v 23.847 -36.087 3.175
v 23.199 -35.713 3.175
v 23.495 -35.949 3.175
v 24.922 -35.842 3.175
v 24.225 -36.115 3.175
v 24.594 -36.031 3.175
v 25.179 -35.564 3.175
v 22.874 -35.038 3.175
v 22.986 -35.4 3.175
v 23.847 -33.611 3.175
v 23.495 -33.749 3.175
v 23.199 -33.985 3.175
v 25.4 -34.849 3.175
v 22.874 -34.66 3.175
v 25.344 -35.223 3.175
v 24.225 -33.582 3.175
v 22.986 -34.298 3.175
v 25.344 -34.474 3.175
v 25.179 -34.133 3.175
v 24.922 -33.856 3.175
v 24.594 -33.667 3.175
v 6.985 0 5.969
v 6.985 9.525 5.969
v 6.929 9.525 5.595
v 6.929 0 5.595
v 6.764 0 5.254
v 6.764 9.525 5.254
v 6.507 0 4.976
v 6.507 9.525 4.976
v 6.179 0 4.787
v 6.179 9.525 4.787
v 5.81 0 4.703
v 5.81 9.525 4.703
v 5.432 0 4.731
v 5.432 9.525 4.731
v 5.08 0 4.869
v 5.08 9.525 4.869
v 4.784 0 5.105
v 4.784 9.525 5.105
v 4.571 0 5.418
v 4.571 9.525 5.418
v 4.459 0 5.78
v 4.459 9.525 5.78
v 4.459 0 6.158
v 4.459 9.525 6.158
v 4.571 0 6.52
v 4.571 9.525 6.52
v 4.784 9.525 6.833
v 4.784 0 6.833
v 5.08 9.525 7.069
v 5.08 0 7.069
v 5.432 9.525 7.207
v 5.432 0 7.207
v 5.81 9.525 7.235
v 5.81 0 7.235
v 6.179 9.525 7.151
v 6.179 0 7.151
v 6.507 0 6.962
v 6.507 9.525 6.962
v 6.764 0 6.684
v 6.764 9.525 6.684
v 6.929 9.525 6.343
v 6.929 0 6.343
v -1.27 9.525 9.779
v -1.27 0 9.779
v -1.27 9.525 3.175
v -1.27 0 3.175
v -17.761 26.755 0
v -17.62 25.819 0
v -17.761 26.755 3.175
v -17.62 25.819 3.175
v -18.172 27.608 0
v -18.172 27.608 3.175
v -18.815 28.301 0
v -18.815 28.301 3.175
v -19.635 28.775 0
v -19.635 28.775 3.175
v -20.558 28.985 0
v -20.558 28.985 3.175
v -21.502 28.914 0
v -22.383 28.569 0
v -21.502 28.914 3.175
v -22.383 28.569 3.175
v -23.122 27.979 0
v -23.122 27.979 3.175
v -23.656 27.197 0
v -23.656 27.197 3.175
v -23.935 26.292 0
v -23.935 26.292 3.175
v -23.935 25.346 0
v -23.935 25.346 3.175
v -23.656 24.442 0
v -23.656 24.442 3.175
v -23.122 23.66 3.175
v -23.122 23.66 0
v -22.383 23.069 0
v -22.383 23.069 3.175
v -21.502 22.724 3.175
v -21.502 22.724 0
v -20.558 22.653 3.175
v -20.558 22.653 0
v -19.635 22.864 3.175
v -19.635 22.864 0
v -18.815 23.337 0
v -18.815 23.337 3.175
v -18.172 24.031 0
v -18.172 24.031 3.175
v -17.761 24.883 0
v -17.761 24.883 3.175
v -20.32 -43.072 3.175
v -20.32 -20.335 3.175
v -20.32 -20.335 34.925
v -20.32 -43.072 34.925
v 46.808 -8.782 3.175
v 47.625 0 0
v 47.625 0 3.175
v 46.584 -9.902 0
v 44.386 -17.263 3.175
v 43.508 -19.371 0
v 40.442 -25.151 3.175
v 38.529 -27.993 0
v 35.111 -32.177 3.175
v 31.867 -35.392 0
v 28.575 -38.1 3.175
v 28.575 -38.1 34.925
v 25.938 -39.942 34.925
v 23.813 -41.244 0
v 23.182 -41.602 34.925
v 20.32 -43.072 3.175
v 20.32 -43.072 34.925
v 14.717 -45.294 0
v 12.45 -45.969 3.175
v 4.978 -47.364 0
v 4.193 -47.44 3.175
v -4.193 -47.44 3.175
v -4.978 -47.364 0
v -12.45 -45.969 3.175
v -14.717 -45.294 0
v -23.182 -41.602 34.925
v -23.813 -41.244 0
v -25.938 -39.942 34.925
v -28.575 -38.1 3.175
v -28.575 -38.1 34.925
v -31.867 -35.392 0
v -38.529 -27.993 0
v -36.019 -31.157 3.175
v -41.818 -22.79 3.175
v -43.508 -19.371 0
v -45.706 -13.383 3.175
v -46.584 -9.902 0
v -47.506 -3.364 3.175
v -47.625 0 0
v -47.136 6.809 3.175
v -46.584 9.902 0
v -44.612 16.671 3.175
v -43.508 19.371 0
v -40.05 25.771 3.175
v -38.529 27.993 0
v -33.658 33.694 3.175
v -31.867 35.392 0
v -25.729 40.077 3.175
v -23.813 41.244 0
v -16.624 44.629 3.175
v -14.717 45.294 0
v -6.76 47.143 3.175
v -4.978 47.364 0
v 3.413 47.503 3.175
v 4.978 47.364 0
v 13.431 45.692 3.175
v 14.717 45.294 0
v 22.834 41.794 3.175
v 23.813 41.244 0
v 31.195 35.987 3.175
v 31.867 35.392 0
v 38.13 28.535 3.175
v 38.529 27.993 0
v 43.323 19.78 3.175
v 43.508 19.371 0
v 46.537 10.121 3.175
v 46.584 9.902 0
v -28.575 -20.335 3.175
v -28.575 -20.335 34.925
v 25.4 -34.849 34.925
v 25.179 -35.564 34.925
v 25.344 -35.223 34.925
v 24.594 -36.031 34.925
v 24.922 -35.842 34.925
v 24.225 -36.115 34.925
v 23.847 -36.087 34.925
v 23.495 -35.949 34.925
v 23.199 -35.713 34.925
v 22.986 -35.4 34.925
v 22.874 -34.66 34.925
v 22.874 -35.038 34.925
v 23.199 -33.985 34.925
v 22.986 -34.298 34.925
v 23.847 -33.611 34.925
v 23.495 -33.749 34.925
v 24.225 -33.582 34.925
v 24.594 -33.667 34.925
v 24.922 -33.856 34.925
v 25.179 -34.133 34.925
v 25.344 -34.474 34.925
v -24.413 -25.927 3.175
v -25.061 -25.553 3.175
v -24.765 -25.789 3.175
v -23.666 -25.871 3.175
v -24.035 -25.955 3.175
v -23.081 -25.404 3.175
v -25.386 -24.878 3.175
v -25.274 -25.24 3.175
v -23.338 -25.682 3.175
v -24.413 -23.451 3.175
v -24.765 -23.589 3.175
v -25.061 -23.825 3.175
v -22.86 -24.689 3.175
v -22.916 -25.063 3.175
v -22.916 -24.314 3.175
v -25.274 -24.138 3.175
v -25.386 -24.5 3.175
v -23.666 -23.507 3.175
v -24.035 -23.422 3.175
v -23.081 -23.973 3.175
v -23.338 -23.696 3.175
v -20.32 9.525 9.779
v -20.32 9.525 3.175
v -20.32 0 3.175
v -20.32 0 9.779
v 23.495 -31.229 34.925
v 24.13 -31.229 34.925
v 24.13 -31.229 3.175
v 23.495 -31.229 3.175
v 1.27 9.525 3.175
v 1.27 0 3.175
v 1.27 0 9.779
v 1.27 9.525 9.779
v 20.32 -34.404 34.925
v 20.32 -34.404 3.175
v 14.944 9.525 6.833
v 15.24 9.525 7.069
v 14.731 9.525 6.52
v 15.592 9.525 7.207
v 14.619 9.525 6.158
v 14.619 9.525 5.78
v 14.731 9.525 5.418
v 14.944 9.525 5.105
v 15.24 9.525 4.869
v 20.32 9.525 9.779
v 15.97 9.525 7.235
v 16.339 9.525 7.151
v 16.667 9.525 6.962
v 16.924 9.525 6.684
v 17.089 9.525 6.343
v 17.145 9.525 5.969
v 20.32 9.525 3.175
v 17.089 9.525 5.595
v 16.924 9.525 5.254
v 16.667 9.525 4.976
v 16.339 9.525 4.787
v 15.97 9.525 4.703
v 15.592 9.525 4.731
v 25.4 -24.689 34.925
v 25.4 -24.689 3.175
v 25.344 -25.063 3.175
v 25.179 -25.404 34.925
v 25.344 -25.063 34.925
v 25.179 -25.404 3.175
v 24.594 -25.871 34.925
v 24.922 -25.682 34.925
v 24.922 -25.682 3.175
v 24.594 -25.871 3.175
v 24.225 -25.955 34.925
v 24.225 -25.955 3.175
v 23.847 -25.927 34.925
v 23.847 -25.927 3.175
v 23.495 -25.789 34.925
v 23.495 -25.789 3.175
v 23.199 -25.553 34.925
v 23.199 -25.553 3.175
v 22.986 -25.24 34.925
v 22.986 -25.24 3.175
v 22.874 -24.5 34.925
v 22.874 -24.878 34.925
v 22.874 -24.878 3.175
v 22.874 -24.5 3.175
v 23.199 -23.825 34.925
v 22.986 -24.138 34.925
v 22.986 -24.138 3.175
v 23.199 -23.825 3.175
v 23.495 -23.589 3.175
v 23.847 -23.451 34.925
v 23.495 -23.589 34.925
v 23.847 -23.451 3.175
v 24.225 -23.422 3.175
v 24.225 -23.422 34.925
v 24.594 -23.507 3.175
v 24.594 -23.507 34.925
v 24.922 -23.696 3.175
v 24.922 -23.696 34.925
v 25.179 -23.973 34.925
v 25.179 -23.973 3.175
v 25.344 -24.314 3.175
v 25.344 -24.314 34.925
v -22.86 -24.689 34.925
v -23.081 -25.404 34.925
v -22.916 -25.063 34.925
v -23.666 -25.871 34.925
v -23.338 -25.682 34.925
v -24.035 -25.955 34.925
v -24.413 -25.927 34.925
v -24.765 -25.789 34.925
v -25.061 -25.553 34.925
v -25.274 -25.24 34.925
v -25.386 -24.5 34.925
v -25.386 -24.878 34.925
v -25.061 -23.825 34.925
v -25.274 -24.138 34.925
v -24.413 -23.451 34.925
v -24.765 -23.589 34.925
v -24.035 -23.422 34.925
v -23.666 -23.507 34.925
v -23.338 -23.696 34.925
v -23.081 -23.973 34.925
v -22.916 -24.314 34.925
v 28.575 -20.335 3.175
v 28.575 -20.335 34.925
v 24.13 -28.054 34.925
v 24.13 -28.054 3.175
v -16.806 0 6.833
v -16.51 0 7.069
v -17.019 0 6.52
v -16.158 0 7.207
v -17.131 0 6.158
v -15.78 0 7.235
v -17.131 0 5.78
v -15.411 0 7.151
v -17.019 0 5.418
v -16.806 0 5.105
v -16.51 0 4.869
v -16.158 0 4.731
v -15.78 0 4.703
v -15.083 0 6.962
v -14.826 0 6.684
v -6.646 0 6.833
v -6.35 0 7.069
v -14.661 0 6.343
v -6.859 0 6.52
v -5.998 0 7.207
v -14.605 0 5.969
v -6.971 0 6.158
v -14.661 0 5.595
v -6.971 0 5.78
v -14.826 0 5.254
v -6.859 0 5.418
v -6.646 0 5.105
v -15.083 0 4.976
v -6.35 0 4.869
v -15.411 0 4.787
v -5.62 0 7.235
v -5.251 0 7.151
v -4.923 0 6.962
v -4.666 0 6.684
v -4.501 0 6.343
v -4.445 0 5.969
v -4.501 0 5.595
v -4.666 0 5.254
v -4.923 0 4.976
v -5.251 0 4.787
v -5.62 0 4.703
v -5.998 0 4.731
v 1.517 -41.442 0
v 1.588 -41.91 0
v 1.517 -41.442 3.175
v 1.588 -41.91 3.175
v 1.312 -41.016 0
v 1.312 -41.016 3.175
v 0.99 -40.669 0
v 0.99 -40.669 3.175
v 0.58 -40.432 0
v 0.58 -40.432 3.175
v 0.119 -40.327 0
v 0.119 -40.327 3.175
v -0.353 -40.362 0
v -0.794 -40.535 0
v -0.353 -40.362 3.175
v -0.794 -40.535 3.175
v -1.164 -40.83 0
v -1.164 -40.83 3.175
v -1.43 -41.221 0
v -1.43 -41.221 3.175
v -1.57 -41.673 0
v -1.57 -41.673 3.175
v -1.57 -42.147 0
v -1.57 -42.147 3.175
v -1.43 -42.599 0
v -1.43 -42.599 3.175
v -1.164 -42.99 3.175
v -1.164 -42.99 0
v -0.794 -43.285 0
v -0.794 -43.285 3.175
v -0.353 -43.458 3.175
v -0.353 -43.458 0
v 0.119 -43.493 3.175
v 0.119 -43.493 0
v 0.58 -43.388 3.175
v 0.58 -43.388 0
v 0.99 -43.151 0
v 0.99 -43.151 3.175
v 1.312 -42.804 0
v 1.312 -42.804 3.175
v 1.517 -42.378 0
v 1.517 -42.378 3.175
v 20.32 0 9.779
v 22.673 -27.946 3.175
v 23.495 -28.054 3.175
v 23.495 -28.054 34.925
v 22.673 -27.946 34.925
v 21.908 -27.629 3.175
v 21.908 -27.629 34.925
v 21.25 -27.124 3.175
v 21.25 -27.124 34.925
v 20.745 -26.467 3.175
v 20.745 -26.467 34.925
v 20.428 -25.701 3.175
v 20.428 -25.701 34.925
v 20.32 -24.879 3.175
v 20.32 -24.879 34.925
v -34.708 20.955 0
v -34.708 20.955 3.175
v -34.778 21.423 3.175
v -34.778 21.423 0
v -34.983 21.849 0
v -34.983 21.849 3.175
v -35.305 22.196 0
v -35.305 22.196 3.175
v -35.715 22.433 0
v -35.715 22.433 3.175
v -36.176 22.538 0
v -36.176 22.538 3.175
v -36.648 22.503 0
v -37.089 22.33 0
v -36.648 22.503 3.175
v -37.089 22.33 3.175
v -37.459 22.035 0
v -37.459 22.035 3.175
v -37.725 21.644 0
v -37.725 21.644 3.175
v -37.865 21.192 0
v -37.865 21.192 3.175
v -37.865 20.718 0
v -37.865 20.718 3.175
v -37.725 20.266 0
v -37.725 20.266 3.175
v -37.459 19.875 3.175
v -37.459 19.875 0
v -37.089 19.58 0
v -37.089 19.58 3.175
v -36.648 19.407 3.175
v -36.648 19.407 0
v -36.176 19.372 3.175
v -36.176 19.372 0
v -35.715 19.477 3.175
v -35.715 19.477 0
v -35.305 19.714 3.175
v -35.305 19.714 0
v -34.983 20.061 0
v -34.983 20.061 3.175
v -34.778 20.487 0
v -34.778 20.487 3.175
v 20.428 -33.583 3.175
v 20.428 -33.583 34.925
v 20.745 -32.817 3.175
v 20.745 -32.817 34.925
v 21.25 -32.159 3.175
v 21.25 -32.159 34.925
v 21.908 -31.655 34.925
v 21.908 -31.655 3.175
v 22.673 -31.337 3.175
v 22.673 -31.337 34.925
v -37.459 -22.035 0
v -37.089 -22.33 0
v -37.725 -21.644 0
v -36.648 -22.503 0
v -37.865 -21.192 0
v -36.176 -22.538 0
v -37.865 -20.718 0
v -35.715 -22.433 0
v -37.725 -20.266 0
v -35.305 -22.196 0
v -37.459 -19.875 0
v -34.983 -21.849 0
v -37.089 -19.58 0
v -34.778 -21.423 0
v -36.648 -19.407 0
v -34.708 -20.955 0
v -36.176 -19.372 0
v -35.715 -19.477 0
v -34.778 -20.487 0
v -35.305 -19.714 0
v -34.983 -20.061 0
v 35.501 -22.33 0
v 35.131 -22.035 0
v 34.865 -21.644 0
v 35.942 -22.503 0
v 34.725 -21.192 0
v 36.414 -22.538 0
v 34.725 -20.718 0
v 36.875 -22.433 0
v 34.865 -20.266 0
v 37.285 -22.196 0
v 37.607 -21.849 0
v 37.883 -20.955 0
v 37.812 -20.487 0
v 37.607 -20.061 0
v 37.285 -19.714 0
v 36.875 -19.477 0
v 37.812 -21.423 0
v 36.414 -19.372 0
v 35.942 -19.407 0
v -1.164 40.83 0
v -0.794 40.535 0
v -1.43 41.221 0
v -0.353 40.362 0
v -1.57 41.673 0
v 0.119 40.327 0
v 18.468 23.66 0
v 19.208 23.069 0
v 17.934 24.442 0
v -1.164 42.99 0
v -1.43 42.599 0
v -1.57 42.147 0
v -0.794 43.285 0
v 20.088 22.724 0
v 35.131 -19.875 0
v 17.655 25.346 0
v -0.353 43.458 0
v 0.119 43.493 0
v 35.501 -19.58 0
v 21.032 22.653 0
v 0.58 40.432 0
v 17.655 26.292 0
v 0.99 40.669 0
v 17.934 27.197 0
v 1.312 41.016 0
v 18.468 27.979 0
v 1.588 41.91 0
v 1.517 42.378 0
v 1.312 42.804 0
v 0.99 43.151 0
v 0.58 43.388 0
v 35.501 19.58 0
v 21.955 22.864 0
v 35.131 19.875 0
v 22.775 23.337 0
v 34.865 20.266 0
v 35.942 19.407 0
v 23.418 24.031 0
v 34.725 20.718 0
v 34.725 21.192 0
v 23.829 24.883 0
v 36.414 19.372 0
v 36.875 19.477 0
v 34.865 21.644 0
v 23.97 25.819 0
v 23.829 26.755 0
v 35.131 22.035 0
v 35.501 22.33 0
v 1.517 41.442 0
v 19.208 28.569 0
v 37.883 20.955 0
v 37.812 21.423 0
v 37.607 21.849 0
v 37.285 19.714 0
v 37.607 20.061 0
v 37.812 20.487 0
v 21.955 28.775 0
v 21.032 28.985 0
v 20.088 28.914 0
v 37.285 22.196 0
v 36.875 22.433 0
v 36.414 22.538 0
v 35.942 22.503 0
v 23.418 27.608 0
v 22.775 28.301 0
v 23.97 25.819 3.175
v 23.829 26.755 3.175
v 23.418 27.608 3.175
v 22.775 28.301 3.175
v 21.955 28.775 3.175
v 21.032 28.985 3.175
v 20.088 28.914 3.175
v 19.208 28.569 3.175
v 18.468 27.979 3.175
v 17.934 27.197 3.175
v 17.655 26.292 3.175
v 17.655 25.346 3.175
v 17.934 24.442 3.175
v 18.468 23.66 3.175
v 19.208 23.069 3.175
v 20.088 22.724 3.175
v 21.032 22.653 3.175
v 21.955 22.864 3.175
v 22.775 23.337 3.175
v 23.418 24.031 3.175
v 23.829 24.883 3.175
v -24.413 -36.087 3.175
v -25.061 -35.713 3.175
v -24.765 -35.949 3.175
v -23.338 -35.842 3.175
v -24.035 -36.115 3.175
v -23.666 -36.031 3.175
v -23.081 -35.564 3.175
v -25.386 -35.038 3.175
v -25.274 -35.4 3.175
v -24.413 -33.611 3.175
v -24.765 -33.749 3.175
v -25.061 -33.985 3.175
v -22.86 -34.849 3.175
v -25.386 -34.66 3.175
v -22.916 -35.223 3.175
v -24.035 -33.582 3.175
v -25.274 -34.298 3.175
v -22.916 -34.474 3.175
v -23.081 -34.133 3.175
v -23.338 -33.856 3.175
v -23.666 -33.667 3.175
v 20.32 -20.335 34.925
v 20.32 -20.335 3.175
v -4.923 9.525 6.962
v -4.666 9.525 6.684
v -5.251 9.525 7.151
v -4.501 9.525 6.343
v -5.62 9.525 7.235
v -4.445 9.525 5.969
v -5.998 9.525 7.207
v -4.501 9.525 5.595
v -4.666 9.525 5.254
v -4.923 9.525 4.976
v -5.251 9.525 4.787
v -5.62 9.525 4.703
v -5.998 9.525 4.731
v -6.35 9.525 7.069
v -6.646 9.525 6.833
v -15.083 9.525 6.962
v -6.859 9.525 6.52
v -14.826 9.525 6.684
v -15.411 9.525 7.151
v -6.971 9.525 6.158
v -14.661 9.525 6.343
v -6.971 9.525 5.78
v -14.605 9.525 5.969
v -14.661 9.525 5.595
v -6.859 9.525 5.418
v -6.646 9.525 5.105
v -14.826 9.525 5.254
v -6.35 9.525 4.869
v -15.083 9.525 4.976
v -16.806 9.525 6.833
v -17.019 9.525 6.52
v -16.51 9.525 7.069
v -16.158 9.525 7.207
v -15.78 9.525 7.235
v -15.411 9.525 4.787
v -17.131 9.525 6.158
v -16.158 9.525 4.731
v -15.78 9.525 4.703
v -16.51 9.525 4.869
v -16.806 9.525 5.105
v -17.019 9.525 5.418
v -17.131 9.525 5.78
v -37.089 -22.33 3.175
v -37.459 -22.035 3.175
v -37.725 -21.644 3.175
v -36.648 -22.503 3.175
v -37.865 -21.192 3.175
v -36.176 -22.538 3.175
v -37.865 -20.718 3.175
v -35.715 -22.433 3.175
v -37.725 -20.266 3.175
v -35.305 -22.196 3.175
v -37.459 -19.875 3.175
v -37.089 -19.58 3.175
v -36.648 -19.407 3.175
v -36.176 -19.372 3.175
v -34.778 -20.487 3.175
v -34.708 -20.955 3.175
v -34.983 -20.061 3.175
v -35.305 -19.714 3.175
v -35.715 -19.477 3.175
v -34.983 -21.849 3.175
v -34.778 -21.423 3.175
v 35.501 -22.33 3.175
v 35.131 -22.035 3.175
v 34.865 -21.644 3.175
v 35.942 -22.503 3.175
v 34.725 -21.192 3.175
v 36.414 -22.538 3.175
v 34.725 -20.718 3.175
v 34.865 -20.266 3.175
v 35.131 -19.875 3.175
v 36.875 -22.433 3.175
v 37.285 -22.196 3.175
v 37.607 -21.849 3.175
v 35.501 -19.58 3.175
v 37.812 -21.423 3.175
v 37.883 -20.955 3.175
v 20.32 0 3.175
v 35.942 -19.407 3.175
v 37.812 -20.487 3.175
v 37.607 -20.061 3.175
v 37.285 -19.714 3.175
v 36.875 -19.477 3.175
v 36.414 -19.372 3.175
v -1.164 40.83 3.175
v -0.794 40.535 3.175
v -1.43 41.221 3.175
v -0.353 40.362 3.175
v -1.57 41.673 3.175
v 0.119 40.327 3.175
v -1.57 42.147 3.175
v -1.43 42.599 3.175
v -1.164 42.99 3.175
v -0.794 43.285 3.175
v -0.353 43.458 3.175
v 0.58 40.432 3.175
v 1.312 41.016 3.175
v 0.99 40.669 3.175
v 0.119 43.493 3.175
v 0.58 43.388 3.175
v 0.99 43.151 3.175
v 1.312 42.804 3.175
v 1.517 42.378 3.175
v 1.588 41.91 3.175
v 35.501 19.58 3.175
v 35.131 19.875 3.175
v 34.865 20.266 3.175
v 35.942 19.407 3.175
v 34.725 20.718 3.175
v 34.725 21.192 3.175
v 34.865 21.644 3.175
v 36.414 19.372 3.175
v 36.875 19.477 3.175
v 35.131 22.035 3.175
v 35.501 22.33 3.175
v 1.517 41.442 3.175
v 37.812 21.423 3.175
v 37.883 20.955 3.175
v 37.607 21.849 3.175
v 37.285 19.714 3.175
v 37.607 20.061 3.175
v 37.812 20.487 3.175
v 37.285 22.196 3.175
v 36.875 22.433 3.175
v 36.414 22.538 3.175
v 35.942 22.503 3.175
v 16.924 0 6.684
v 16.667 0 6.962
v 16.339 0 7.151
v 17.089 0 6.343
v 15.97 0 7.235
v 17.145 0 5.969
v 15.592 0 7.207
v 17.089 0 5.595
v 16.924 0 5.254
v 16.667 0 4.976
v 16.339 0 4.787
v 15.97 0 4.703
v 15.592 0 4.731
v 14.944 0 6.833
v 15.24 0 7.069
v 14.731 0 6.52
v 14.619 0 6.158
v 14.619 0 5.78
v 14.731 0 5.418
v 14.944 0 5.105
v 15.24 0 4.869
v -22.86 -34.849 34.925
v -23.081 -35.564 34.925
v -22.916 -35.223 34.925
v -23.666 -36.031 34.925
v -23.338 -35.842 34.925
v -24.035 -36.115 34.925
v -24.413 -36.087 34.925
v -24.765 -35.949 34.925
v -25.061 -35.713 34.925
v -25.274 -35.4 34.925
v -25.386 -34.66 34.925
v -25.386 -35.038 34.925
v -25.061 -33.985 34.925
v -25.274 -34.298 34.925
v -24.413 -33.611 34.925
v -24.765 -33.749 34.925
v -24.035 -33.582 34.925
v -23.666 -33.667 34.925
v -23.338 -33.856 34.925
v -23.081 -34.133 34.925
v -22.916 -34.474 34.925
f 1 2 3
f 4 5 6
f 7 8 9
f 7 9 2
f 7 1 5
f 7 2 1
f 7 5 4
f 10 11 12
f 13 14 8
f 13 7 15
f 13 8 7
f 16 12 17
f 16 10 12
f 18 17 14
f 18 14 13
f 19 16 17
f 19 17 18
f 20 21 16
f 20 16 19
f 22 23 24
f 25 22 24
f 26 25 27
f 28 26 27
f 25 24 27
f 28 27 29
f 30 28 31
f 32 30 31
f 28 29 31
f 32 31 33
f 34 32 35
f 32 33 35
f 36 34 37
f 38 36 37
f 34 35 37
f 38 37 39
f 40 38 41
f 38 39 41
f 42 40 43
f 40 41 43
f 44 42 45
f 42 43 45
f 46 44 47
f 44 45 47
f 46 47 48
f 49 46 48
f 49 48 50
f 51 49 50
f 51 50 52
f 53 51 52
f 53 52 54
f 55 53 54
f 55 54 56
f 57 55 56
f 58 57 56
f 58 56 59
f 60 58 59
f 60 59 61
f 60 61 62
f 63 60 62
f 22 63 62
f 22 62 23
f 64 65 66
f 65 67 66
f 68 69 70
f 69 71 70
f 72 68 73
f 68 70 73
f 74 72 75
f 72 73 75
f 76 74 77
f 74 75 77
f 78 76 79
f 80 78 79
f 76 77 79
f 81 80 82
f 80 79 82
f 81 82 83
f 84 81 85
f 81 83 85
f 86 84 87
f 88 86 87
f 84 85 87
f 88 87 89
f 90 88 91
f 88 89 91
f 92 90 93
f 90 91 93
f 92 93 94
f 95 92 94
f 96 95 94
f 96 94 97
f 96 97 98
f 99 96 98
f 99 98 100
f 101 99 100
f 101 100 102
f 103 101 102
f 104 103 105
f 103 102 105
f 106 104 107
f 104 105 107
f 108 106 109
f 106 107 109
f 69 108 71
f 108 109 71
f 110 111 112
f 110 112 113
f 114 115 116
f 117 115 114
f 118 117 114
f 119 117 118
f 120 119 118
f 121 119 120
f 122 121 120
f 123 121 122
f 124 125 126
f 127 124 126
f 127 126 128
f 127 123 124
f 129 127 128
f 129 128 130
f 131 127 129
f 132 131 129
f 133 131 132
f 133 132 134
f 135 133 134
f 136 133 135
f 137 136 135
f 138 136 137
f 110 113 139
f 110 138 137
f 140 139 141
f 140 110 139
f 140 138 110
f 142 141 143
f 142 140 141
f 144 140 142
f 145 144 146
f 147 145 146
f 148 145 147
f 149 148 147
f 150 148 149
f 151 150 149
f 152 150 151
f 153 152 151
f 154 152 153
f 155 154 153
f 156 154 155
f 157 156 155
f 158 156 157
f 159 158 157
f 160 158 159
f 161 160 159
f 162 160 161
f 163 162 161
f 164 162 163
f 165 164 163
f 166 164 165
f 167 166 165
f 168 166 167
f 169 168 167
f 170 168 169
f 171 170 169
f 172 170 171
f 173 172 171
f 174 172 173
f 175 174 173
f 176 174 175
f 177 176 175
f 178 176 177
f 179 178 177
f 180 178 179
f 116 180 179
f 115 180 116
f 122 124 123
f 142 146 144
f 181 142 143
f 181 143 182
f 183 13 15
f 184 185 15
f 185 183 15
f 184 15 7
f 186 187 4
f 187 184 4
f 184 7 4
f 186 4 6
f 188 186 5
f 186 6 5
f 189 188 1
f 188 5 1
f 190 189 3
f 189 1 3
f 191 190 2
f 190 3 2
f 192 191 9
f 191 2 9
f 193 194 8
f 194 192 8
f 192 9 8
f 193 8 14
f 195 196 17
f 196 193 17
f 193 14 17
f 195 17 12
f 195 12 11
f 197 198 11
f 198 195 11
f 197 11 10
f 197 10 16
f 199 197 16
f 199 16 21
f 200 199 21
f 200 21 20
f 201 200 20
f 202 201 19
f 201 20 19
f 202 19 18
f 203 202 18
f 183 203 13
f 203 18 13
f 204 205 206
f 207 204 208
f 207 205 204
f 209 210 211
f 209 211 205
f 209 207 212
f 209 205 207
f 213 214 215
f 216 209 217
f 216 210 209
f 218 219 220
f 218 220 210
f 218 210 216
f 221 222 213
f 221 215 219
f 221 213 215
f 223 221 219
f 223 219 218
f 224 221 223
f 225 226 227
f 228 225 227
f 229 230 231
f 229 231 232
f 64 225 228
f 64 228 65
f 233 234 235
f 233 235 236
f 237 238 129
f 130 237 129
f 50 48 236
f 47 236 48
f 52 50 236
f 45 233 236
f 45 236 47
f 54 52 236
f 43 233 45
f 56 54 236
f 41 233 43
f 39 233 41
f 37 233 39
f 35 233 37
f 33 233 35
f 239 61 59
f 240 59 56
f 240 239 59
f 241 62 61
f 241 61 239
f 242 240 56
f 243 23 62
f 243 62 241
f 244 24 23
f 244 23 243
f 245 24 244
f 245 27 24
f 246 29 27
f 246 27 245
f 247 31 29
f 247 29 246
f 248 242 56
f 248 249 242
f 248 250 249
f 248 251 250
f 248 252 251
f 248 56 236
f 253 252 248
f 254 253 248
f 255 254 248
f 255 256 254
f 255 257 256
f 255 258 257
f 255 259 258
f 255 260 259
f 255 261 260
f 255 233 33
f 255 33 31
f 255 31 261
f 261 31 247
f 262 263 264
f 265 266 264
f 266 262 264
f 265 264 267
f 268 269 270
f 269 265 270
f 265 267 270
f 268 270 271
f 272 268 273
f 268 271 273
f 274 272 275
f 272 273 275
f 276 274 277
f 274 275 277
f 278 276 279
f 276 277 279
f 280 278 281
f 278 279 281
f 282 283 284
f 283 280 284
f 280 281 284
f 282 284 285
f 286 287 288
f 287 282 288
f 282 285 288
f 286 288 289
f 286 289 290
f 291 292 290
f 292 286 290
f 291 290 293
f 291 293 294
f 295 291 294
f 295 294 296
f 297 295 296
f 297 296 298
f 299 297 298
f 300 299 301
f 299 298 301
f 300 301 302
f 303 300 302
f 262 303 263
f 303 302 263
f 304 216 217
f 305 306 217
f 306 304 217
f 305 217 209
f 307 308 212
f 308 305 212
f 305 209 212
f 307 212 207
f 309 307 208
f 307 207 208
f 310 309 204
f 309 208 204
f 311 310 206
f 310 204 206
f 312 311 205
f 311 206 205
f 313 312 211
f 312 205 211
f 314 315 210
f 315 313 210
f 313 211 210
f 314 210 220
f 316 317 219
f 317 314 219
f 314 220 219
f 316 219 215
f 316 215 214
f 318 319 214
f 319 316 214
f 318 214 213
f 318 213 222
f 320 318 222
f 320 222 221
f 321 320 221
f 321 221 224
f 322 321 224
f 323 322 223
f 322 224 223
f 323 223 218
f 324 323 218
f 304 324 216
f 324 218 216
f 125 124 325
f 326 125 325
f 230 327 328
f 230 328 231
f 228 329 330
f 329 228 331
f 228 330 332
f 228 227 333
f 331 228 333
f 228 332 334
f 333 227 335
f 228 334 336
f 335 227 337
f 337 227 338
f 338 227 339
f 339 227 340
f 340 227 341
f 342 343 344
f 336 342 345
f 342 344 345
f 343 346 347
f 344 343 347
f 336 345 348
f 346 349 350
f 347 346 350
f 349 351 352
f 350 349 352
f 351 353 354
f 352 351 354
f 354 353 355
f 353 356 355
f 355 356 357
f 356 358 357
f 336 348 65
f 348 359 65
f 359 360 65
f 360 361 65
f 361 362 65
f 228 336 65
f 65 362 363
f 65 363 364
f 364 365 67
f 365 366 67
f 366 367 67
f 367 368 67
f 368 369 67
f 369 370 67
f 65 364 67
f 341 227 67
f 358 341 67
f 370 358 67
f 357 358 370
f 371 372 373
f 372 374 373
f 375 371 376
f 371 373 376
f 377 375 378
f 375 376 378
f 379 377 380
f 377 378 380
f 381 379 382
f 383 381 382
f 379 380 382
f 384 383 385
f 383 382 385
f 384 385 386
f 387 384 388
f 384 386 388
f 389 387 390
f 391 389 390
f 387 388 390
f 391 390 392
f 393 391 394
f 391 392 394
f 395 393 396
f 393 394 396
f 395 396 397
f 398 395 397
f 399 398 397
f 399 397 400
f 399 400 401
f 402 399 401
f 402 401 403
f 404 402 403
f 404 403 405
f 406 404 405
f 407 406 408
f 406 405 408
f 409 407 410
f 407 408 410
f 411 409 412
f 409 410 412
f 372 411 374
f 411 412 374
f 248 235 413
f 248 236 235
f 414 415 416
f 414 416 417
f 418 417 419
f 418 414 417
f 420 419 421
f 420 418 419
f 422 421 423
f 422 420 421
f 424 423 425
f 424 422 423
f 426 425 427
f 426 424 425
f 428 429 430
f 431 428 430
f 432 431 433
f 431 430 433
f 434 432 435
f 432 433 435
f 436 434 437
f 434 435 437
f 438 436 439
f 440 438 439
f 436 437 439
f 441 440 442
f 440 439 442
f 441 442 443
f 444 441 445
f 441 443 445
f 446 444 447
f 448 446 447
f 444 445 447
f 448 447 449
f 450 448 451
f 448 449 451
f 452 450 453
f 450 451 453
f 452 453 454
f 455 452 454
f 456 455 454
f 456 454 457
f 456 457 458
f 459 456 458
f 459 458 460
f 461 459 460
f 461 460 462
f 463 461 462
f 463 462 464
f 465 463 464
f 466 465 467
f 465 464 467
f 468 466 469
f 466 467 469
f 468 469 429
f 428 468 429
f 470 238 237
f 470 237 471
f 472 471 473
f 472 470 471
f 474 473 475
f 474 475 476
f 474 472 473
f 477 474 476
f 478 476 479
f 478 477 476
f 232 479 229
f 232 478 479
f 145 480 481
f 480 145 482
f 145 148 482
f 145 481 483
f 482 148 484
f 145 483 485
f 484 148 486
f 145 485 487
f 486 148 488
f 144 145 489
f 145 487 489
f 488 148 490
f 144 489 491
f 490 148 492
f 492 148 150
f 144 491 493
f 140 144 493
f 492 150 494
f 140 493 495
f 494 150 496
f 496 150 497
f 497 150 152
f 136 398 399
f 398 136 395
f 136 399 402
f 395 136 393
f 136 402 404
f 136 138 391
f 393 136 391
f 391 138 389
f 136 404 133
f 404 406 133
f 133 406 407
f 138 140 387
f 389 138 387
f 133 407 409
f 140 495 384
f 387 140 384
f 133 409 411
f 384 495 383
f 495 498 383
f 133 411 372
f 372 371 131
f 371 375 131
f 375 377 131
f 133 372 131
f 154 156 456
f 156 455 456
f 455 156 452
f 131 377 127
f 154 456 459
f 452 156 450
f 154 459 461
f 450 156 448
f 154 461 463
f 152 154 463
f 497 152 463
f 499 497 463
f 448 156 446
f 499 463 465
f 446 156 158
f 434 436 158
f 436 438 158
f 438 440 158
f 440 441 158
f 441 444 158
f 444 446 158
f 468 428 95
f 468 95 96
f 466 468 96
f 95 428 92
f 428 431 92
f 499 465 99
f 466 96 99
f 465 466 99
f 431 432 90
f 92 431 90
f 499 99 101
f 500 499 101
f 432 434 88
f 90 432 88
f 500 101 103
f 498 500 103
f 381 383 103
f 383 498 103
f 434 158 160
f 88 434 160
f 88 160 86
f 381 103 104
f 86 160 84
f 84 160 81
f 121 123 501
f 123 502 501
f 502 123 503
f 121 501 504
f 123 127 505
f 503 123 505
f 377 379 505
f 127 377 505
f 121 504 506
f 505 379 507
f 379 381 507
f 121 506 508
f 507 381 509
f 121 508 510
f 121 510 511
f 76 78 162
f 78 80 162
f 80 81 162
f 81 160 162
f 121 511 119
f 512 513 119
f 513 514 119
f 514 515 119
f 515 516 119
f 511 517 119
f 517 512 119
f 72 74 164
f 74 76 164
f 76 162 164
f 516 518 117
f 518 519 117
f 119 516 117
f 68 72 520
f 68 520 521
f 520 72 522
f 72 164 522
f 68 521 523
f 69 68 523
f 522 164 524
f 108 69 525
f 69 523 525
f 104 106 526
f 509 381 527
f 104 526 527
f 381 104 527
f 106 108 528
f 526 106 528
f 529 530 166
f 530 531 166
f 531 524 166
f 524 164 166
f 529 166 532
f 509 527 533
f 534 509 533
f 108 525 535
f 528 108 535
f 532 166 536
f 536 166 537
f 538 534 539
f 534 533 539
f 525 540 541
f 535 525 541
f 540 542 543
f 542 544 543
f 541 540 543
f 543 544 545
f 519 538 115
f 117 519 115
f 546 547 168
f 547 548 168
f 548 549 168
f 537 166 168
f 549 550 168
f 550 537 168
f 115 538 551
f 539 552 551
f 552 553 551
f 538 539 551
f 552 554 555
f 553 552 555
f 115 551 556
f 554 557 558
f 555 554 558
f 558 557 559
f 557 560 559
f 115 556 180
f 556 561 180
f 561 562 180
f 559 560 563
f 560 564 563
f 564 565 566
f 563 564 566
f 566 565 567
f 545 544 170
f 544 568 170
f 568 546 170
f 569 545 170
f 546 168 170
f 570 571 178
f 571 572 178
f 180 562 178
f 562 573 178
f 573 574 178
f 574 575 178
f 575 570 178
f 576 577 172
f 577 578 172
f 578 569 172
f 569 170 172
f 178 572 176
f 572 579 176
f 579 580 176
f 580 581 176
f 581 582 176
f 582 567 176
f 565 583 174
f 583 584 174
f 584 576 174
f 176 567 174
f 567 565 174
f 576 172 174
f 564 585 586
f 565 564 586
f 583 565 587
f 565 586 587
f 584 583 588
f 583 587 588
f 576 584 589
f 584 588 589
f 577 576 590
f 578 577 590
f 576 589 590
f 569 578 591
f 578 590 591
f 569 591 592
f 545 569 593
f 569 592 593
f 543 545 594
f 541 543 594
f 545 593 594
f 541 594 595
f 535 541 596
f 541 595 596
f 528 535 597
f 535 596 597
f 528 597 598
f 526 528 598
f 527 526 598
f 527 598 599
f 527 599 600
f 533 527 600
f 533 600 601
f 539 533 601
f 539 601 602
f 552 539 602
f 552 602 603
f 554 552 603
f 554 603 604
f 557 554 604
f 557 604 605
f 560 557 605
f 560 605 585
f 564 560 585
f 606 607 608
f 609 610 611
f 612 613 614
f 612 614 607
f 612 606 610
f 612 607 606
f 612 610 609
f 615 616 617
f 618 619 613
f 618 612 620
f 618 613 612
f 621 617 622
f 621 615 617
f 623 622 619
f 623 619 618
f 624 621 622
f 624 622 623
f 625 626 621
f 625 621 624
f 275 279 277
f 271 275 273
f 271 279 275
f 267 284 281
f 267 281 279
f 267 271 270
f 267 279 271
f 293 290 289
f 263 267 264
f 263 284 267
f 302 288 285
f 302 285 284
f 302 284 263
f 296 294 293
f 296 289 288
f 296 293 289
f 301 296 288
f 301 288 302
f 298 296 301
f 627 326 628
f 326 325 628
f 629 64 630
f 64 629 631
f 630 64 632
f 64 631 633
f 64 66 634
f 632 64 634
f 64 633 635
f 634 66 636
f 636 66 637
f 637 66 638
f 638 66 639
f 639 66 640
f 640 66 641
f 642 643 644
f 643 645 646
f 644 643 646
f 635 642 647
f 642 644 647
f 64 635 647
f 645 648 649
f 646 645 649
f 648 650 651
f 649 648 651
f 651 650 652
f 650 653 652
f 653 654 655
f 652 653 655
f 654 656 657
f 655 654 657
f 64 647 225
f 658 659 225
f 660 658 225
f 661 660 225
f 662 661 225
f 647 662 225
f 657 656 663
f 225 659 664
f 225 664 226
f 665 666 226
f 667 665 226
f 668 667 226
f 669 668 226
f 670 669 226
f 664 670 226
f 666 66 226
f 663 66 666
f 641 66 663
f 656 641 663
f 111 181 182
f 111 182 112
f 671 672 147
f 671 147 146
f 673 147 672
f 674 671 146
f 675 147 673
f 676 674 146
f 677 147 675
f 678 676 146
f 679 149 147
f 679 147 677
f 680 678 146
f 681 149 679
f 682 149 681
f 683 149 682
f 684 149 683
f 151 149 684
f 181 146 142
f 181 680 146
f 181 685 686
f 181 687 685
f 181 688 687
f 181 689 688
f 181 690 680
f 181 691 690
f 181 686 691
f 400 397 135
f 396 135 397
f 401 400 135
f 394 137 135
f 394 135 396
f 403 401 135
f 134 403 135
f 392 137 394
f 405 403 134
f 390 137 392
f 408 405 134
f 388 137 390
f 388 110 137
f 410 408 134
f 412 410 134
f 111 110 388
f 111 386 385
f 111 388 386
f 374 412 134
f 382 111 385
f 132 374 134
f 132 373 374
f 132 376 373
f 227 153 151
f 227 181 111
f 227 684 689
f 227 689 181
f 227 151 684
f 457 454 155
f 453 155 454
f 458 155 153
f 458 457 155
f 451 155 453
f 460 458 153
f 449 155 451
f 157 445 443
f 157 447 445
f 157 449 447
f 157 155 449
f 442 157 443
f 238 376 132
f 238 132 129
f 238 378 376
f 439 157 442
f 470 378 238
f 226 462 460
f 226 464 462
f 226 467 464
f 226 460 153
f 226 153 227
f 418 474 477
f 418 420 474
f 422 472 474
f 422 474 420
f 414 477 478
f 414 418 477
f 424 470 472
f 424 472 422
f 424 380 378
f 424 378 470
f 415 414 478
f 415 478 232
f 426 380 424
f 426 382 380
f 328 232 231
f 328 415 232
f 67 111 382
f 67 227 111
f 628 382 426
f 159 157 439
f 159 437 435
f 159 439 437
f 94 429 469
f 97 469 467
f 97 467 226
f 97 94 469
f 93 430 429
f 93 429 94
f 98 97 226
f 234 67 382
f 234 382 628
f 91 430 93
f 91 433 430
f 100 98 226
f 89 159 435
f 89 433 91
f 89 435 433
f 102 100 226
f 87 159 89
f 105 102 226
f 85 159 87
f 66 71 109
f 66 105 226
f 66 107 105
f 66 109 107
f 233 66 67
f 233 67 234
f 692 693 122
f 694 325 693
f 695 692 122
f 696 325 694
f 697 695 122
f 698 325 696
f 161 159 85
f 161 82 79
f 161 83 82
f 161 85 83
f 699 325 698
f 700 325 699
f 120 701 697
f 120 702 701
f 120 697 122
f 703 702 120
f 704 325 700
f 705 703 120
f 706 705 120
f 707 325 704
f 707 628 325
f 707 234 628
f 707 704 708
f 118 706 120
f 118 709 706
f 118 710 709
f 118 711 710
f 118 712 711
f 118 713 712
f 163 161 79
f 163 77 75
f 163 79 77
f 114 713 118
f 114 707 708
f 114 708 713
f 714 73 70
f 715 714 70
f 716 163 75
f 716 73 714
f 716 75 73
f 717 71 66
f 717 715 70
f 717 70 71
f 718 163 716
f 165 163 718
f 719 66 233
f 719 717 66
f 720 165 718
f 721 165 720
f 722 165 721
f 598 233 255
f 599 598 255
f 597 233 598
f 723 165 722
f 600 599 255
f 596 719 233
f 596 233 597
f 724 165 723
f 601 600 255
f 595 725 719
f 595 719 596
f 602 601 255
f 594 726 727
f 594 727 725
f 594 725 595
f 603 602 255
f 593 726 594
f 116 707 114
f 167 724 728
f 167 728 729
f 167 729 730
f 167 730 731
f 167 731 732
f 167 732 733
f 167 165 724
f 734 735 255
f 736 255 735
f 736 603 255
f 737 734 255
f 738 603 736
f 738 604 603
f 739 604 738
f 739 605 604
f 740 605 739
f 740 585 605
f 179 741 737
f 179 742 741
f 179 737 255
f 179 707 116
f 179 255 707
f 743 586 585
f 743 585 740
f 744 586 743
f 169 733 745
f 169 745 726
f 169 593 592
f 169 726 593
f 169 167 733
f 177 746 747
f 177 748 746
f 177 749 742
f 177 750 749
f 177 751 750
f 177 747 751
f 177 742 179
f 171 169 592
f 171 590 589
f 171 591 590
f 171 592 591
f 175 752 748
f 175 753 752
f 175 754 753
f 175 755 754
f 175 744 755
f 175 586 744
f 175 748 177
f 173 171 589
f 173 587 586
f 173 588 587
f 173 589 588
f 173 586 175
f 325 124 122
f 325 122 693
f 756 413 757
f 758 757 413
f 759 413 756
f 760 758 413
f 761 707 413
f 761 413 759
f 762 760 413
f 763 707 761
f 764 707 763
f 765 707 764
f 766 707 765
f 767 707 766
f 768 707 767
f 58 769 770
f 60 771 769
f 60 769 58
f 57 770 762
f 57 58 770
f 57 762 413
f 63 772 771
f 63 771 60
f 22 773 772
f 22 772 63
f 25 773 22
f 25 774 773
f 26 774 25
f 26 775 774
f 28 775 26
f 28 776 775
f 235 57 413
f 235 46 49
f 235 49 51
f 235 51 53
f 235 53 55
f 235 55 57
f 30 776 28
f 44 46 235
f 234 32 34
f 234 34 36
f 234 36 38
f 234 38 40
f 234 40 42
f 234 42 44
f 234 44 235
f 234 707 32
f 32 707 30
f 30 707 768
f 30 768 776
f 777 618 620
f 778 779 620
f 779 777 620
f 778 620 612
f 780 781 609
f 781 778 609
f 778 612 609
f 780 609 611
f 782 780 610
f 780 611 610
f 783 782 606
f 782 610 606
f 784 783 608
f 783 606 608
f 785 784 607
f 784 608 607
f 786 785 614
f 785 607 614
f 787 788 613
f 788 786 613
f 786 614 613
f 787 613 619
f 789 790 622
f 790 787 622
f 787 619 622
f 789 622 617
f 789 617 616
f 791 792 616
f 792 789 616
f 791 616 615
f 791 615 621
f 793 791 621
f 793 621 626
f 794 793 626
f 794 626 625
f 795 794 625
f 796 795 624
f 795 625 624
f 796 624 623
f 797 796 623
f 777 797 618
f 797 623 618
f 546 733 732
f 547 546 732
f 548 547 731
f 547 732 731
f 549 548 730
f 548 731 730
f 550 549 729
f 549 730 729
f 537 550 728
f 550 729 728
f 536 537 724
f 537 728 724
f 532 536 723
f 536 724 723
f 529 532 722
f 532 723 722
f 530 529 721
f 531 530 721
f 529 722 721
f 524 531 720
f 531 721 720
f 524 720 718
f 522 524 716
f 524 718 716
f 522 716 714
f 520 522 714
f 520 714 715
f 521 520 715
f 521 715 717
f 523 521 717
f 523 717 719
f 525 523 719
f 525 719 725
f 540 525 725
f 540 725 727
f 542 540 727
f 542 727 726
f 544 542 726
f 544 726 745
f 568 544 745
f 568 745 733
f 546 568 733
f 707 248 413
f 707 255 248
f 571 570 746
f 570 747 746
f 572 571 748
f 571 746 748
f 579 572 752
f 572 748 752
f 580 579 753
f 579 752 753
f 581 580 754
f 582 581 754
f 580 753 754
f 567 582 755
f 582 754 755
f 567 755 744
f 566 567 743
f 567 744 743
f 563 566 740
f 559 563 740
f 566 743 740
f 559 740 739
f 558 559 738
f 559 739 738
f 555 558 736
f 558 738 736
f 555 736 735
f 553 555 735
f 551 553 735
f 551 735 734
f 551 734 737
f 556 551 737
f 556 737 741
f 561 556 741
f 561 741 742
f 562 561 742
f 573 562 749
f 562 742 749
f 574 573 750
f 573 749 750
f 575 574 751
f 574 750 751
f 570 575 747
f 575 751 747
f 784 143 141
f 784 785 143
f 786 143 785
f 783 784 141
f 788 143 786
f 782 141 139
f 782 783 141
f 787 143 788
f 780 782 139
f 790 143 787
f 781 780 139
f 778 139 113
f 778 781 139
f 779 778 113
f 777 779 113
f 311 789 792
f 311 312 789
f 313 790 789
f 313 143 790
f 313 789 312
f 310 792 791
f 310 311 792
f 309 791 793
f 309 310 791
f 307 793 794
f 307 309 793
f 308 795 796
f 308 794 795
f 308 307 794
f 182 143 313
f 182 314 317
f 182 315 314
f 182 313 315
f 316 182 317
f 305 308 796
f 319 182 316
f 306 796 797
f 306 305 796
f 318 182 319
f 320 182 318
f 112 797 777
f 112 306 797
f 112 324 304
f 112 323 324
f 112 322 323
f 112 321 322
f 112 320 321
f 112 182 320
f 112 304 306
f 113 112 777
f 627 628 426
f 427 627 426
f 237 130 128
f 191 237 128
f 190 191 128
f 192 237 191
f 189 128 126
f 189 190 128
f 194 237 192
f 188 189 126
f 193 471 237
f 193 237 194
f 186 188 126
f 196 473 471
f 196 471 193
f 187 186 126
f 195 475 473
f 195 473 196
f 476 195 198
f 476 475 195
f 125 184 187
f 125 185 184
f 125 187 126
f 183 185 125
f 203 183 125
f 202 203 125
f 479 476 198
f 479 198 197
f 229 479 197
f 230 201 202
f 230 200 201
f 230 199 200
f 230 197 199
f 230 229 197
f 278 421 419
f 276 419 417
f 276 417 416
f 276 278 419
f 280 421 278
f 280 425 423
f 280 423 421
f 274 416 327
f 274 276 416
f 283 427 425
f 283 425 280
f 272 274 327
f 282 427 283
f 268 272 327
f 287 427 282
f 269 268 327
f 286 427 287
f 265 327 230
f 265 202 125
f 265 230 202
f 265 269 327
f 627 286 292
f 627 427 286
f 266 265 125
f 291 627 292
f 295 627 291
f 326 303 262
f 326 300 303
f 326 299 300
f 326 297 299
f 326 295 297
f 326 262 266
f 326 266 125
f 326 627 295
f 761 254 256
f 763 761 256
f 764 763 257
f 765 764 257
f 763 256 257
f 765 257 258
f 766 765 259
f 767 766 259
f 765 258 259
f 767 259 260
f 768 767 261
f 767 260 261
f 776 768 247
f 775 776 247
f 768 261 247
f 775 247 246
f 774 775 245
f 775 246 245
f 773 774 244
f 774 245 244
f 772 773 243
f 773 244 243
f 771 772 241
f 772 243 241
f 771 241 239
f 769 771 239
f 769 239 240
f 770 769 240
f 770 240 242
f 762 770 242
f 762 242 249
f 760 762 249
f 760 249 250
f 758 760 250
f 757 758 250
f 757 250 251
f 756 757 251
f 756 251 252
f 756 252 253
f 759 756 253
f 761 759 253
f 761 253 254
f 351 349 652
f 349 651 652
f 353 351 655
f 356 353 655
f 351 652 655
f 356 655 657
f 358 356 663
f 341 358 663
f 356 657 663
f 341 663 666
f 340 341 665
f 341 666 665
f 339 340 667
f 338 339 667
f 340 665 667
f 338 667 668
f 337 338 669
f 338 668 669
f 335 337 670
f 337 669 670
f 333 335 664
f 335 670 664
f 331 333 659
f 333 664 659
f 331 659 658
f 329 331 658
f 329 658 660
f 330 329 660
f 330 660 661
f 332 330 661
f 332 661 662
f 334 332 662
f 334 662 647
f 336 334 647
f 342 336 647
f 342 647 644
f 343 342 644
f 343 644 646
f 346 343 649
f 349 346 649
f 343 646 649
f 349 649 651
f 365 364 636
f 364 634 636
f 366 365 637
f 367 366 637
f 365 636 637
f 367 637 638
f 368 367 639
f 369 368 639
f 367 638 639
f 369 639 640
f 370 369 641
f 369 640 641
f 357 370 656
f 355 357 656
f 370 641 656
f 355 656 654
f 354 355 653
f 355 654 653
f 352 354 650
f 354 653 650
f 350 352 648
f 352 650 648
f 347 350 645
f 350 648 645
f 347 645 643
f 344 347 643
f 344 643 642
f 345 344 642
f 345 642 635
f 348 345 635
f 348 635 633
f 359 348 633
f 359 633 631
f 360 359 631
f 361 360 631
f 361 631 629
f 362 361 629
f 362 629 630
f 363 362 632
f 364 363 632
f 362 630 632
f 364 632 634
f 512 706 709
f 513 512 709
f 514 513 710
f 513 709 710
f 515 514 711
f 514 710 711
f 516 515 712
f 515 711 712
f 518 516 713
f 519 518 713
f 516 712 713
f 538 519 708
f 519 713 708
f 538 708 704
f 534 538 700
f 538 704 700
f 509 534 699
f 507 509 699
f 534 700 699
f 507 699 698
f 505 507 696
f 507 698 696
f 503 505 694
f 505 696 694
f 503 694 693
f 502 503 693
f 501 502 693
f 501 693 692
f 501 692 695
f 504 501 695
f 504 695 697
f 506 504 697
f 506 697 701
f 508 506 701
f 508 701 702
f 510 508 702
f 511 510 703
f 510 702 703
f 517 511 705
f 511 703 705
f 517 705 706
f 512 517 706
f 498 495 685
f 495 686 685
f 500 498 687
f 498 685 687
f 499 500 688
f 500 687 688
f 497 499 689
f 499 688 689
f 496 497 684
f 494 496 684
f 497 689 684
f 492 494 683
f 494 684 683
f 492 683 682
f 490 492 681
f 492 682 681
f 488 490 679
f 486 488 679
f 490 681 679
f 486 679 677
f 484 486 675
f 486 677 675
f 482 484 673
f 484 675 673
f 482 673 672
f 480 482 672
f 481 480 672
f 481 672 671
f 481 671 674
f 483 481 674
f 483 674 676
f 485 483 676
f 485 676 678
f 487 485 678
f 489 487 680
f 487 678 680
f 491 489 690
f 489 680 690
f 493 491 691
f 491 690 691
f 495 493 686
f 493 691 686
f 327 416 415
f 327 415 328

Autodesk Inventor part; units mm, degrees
ref_plane "YZ Plane" through (0, 0, 0) normal (1, 0, 0) x (0, 1, 0)
ref_plane "XZ Plane" through (0, 0, 0) normal (0, 1, 0) x (-1, 0, 0)
ref_plane "XY Plane" through (0, 0, 0) normal (0, 0, 1) x (1, 0, 0)
sketch "Sketch1" plane through (0, 0, 0) normal (0, 0, 1) x (1, 0, 0)
  circle A0 centre (0, 0) radius 47.625
  dimension "d0" = 95.25
extrude "Extrusion1" add sketch "Sketch1" along normal blind 3.175
sketch "Sketch3" plane through (0, 0, 3.175) normal (0, 0, 1) x (1, 0, 0)
  line L0 (1.27, 9.525) -> (20.32, 9.525)
  line L1 (20.32, 9.525) -> (20.32, 0)
  line L2 (20.32, 0) -> (1.27, 0)
  line L3 (1.27, 0) -> (1.27, 9.525)
  line L4 (0, 0) -> (0, -11.0035)
  line L5 (-1.27, 9.525) -> (-20.32, 9.525)
  line L6 (-20.32, 9.525) -> (-20.32, 0)
  line L7 (-20.32, 0) -> (-1.27, 0)
  line L8 (-1.27, 0) -> (-1.27, 9.525)
  dimension "d11" = 19.05
  dimension "d12" = 9.525
  dimension "d13" = 1.27
  dimension "d14" = 0
extrude "Extrusion3" add sketch "Sketch3" along normal blind 6.604
sketch "Sketch4" plane through (1.27, 9.525, 3.175) normal (0, 1, 0) x (1, 0, 0)
  circle A0 centre (4.445, -2.794) radius 1.27
  line L0 (19.05, -6.604) -> (0, -6.604) projected
  circle A1 centre (14.605, -2.794) radius 1.27
  line L1 (9.525, -6.604) -> (9.525, -7.9119)
  line L2 (-1.27, 3.175) -> (-1.27, 8.3959)
  circle A2 centre (-6.985, -2.794) radius 1.27
  circle A3 centre (-17.145, -2.794) radius 1.27
  dimension "d17" = 2.54
  dimension "d18" = 3.81
  dimension "d19" = 2.54
  dimension "d20" = 3.81
  dimension "d21" = 10.16
  dimension "d22" = 5.08
extrude "Extrusion4" cut sketch "Sketch4" against normal through all
sketch "Sketch5" plane through (0, 0, 3.175) normal (0, 0, 1) x (1, 0, 0)
  circle A0 centre (20.795, 25.8191) radius 3.175
  line L0 (0, 0) -> (0, 16.9345)
  circle A1 centre (-20.795, 25.8191) radius 3.175
  dimension "d25" = 6.35
  dimension "d26" = 20.795
  dimension "d27" = 25.8191
extrude "Extrusion5" cut sketch "Sketch5" against normal blind 25.4
sketch "Sketch6" plane through (0, 0, 3.175) normal (0, 0, 1) x (1, 0, 0)
  line L0 (0, 0) -> (0, 41.91)
  circle A0 centre (0, 41.91) radius 1.5875
  circle A1 centre (-36.2951, 20.955) radius 1.5875
  circle A2 centre (-36.2951, -20.955) radius 1.5875
  circle A3 centre (0, -41.91) radius 1.5875
  circle A4 centre (36.2951, -20.955) radius 1.5875
  circle A5 centre (36.2951, 20.955) radius 1.5875
  dimension "d30" = 41.91
  dimension "d31" = 3.175
  dimension "d34" = 360
extrude "Extrusion6" cut sketch "Sketch6" against normal blind 25.4
sketch "Sketch7" plane through (0, 0, 3.175) normal (0, 0, 1) x (1, 0, 0)
  line L0 (-28.575, -20.3352) -> (-20.32, -20.3352)
  line L1 (-20.32, -20.3352) -> (-20.32, -43.0725)
  line L2 (-28.575, -38.1) -> (-28.575, -20.3352)
  circle A0 centre (-24.13, -24.6888) radius 1.27
  circle A1 centre (-24.13, -34.8488) radius 1.27
  circle A2 centre (0, 0) radius 47.625 projected
  line L3 (0, 0) -> (0, -12.4863)
  line L4 (28.575, -20.3352) -> (20.32, -20.3352)
  line L5 (20.32, -20.3352) -> (20.32, -43.0725)
  line L6 (28.575, -38.1) -> (28.575, -20.3352)
  circle A3 centre (24.13, -24.6888) radius 1.27
  circle A4 centre (24.13, -34.8488) radius 1.27
  arc A5 (20.32, -43.0725) -> (28.575, -38.1) centre (0, 0) ccw
  dimension "d38" = 20.32
  dimension "d39" = 2.54
  dimension "d40" = 2.54
  dimension "d41" = 24.6888
  dimension "d42" = 10.16
  dimension "d43" = 3.81
  dimension "d44" = 8.255
extrude "Extrusion7" add sketch "Sketch7" along normal blind 31.75 contours L0 L1 A2 L2 | L5 L4 L6 A2
sketch "Sketch8" plane through (0, 0, 34.925) normal (0, 0, 1) x (1, 0, 0)
  circle A0 centre (24.13, -24.6888) radius 1.27 projected
  circle A1 centre (24.13, -34.8488) radius 1.27 projected
  line L0 (20.32, -20.3352) -> (20.32, -43.0725) projected
  line L1 (20.32, -43.0725) -> (20.32, -20.3352) projected
  line L2 (24.13, -31.2293) -> (20.32, -31.2293)
  line L3 (20.32, -31.2293) -> (20.32, -28.0543)
  line L4 (20.32, -28.0543) -> (24.13, -28.0543)
  line L5 (24.13, -28.0543) -> (24.13, -31.2293)
  point P0 (0, 0)
  dimension "d47" = 3.175
  dimension "d48" = 3.3655
extrude "Extrusion8" cut sketch "Sketch8" against normal up to surface (31.75 mm away) contours L4 L5 L2 L0
fillet "Fillet1" radius 3.175 2 edges at (20.32, -28.0543, 19.05) (20.32, -31.2293, 19.05)
properties part number "rearServoAttachmentPlate" material "ABS Plastic"
